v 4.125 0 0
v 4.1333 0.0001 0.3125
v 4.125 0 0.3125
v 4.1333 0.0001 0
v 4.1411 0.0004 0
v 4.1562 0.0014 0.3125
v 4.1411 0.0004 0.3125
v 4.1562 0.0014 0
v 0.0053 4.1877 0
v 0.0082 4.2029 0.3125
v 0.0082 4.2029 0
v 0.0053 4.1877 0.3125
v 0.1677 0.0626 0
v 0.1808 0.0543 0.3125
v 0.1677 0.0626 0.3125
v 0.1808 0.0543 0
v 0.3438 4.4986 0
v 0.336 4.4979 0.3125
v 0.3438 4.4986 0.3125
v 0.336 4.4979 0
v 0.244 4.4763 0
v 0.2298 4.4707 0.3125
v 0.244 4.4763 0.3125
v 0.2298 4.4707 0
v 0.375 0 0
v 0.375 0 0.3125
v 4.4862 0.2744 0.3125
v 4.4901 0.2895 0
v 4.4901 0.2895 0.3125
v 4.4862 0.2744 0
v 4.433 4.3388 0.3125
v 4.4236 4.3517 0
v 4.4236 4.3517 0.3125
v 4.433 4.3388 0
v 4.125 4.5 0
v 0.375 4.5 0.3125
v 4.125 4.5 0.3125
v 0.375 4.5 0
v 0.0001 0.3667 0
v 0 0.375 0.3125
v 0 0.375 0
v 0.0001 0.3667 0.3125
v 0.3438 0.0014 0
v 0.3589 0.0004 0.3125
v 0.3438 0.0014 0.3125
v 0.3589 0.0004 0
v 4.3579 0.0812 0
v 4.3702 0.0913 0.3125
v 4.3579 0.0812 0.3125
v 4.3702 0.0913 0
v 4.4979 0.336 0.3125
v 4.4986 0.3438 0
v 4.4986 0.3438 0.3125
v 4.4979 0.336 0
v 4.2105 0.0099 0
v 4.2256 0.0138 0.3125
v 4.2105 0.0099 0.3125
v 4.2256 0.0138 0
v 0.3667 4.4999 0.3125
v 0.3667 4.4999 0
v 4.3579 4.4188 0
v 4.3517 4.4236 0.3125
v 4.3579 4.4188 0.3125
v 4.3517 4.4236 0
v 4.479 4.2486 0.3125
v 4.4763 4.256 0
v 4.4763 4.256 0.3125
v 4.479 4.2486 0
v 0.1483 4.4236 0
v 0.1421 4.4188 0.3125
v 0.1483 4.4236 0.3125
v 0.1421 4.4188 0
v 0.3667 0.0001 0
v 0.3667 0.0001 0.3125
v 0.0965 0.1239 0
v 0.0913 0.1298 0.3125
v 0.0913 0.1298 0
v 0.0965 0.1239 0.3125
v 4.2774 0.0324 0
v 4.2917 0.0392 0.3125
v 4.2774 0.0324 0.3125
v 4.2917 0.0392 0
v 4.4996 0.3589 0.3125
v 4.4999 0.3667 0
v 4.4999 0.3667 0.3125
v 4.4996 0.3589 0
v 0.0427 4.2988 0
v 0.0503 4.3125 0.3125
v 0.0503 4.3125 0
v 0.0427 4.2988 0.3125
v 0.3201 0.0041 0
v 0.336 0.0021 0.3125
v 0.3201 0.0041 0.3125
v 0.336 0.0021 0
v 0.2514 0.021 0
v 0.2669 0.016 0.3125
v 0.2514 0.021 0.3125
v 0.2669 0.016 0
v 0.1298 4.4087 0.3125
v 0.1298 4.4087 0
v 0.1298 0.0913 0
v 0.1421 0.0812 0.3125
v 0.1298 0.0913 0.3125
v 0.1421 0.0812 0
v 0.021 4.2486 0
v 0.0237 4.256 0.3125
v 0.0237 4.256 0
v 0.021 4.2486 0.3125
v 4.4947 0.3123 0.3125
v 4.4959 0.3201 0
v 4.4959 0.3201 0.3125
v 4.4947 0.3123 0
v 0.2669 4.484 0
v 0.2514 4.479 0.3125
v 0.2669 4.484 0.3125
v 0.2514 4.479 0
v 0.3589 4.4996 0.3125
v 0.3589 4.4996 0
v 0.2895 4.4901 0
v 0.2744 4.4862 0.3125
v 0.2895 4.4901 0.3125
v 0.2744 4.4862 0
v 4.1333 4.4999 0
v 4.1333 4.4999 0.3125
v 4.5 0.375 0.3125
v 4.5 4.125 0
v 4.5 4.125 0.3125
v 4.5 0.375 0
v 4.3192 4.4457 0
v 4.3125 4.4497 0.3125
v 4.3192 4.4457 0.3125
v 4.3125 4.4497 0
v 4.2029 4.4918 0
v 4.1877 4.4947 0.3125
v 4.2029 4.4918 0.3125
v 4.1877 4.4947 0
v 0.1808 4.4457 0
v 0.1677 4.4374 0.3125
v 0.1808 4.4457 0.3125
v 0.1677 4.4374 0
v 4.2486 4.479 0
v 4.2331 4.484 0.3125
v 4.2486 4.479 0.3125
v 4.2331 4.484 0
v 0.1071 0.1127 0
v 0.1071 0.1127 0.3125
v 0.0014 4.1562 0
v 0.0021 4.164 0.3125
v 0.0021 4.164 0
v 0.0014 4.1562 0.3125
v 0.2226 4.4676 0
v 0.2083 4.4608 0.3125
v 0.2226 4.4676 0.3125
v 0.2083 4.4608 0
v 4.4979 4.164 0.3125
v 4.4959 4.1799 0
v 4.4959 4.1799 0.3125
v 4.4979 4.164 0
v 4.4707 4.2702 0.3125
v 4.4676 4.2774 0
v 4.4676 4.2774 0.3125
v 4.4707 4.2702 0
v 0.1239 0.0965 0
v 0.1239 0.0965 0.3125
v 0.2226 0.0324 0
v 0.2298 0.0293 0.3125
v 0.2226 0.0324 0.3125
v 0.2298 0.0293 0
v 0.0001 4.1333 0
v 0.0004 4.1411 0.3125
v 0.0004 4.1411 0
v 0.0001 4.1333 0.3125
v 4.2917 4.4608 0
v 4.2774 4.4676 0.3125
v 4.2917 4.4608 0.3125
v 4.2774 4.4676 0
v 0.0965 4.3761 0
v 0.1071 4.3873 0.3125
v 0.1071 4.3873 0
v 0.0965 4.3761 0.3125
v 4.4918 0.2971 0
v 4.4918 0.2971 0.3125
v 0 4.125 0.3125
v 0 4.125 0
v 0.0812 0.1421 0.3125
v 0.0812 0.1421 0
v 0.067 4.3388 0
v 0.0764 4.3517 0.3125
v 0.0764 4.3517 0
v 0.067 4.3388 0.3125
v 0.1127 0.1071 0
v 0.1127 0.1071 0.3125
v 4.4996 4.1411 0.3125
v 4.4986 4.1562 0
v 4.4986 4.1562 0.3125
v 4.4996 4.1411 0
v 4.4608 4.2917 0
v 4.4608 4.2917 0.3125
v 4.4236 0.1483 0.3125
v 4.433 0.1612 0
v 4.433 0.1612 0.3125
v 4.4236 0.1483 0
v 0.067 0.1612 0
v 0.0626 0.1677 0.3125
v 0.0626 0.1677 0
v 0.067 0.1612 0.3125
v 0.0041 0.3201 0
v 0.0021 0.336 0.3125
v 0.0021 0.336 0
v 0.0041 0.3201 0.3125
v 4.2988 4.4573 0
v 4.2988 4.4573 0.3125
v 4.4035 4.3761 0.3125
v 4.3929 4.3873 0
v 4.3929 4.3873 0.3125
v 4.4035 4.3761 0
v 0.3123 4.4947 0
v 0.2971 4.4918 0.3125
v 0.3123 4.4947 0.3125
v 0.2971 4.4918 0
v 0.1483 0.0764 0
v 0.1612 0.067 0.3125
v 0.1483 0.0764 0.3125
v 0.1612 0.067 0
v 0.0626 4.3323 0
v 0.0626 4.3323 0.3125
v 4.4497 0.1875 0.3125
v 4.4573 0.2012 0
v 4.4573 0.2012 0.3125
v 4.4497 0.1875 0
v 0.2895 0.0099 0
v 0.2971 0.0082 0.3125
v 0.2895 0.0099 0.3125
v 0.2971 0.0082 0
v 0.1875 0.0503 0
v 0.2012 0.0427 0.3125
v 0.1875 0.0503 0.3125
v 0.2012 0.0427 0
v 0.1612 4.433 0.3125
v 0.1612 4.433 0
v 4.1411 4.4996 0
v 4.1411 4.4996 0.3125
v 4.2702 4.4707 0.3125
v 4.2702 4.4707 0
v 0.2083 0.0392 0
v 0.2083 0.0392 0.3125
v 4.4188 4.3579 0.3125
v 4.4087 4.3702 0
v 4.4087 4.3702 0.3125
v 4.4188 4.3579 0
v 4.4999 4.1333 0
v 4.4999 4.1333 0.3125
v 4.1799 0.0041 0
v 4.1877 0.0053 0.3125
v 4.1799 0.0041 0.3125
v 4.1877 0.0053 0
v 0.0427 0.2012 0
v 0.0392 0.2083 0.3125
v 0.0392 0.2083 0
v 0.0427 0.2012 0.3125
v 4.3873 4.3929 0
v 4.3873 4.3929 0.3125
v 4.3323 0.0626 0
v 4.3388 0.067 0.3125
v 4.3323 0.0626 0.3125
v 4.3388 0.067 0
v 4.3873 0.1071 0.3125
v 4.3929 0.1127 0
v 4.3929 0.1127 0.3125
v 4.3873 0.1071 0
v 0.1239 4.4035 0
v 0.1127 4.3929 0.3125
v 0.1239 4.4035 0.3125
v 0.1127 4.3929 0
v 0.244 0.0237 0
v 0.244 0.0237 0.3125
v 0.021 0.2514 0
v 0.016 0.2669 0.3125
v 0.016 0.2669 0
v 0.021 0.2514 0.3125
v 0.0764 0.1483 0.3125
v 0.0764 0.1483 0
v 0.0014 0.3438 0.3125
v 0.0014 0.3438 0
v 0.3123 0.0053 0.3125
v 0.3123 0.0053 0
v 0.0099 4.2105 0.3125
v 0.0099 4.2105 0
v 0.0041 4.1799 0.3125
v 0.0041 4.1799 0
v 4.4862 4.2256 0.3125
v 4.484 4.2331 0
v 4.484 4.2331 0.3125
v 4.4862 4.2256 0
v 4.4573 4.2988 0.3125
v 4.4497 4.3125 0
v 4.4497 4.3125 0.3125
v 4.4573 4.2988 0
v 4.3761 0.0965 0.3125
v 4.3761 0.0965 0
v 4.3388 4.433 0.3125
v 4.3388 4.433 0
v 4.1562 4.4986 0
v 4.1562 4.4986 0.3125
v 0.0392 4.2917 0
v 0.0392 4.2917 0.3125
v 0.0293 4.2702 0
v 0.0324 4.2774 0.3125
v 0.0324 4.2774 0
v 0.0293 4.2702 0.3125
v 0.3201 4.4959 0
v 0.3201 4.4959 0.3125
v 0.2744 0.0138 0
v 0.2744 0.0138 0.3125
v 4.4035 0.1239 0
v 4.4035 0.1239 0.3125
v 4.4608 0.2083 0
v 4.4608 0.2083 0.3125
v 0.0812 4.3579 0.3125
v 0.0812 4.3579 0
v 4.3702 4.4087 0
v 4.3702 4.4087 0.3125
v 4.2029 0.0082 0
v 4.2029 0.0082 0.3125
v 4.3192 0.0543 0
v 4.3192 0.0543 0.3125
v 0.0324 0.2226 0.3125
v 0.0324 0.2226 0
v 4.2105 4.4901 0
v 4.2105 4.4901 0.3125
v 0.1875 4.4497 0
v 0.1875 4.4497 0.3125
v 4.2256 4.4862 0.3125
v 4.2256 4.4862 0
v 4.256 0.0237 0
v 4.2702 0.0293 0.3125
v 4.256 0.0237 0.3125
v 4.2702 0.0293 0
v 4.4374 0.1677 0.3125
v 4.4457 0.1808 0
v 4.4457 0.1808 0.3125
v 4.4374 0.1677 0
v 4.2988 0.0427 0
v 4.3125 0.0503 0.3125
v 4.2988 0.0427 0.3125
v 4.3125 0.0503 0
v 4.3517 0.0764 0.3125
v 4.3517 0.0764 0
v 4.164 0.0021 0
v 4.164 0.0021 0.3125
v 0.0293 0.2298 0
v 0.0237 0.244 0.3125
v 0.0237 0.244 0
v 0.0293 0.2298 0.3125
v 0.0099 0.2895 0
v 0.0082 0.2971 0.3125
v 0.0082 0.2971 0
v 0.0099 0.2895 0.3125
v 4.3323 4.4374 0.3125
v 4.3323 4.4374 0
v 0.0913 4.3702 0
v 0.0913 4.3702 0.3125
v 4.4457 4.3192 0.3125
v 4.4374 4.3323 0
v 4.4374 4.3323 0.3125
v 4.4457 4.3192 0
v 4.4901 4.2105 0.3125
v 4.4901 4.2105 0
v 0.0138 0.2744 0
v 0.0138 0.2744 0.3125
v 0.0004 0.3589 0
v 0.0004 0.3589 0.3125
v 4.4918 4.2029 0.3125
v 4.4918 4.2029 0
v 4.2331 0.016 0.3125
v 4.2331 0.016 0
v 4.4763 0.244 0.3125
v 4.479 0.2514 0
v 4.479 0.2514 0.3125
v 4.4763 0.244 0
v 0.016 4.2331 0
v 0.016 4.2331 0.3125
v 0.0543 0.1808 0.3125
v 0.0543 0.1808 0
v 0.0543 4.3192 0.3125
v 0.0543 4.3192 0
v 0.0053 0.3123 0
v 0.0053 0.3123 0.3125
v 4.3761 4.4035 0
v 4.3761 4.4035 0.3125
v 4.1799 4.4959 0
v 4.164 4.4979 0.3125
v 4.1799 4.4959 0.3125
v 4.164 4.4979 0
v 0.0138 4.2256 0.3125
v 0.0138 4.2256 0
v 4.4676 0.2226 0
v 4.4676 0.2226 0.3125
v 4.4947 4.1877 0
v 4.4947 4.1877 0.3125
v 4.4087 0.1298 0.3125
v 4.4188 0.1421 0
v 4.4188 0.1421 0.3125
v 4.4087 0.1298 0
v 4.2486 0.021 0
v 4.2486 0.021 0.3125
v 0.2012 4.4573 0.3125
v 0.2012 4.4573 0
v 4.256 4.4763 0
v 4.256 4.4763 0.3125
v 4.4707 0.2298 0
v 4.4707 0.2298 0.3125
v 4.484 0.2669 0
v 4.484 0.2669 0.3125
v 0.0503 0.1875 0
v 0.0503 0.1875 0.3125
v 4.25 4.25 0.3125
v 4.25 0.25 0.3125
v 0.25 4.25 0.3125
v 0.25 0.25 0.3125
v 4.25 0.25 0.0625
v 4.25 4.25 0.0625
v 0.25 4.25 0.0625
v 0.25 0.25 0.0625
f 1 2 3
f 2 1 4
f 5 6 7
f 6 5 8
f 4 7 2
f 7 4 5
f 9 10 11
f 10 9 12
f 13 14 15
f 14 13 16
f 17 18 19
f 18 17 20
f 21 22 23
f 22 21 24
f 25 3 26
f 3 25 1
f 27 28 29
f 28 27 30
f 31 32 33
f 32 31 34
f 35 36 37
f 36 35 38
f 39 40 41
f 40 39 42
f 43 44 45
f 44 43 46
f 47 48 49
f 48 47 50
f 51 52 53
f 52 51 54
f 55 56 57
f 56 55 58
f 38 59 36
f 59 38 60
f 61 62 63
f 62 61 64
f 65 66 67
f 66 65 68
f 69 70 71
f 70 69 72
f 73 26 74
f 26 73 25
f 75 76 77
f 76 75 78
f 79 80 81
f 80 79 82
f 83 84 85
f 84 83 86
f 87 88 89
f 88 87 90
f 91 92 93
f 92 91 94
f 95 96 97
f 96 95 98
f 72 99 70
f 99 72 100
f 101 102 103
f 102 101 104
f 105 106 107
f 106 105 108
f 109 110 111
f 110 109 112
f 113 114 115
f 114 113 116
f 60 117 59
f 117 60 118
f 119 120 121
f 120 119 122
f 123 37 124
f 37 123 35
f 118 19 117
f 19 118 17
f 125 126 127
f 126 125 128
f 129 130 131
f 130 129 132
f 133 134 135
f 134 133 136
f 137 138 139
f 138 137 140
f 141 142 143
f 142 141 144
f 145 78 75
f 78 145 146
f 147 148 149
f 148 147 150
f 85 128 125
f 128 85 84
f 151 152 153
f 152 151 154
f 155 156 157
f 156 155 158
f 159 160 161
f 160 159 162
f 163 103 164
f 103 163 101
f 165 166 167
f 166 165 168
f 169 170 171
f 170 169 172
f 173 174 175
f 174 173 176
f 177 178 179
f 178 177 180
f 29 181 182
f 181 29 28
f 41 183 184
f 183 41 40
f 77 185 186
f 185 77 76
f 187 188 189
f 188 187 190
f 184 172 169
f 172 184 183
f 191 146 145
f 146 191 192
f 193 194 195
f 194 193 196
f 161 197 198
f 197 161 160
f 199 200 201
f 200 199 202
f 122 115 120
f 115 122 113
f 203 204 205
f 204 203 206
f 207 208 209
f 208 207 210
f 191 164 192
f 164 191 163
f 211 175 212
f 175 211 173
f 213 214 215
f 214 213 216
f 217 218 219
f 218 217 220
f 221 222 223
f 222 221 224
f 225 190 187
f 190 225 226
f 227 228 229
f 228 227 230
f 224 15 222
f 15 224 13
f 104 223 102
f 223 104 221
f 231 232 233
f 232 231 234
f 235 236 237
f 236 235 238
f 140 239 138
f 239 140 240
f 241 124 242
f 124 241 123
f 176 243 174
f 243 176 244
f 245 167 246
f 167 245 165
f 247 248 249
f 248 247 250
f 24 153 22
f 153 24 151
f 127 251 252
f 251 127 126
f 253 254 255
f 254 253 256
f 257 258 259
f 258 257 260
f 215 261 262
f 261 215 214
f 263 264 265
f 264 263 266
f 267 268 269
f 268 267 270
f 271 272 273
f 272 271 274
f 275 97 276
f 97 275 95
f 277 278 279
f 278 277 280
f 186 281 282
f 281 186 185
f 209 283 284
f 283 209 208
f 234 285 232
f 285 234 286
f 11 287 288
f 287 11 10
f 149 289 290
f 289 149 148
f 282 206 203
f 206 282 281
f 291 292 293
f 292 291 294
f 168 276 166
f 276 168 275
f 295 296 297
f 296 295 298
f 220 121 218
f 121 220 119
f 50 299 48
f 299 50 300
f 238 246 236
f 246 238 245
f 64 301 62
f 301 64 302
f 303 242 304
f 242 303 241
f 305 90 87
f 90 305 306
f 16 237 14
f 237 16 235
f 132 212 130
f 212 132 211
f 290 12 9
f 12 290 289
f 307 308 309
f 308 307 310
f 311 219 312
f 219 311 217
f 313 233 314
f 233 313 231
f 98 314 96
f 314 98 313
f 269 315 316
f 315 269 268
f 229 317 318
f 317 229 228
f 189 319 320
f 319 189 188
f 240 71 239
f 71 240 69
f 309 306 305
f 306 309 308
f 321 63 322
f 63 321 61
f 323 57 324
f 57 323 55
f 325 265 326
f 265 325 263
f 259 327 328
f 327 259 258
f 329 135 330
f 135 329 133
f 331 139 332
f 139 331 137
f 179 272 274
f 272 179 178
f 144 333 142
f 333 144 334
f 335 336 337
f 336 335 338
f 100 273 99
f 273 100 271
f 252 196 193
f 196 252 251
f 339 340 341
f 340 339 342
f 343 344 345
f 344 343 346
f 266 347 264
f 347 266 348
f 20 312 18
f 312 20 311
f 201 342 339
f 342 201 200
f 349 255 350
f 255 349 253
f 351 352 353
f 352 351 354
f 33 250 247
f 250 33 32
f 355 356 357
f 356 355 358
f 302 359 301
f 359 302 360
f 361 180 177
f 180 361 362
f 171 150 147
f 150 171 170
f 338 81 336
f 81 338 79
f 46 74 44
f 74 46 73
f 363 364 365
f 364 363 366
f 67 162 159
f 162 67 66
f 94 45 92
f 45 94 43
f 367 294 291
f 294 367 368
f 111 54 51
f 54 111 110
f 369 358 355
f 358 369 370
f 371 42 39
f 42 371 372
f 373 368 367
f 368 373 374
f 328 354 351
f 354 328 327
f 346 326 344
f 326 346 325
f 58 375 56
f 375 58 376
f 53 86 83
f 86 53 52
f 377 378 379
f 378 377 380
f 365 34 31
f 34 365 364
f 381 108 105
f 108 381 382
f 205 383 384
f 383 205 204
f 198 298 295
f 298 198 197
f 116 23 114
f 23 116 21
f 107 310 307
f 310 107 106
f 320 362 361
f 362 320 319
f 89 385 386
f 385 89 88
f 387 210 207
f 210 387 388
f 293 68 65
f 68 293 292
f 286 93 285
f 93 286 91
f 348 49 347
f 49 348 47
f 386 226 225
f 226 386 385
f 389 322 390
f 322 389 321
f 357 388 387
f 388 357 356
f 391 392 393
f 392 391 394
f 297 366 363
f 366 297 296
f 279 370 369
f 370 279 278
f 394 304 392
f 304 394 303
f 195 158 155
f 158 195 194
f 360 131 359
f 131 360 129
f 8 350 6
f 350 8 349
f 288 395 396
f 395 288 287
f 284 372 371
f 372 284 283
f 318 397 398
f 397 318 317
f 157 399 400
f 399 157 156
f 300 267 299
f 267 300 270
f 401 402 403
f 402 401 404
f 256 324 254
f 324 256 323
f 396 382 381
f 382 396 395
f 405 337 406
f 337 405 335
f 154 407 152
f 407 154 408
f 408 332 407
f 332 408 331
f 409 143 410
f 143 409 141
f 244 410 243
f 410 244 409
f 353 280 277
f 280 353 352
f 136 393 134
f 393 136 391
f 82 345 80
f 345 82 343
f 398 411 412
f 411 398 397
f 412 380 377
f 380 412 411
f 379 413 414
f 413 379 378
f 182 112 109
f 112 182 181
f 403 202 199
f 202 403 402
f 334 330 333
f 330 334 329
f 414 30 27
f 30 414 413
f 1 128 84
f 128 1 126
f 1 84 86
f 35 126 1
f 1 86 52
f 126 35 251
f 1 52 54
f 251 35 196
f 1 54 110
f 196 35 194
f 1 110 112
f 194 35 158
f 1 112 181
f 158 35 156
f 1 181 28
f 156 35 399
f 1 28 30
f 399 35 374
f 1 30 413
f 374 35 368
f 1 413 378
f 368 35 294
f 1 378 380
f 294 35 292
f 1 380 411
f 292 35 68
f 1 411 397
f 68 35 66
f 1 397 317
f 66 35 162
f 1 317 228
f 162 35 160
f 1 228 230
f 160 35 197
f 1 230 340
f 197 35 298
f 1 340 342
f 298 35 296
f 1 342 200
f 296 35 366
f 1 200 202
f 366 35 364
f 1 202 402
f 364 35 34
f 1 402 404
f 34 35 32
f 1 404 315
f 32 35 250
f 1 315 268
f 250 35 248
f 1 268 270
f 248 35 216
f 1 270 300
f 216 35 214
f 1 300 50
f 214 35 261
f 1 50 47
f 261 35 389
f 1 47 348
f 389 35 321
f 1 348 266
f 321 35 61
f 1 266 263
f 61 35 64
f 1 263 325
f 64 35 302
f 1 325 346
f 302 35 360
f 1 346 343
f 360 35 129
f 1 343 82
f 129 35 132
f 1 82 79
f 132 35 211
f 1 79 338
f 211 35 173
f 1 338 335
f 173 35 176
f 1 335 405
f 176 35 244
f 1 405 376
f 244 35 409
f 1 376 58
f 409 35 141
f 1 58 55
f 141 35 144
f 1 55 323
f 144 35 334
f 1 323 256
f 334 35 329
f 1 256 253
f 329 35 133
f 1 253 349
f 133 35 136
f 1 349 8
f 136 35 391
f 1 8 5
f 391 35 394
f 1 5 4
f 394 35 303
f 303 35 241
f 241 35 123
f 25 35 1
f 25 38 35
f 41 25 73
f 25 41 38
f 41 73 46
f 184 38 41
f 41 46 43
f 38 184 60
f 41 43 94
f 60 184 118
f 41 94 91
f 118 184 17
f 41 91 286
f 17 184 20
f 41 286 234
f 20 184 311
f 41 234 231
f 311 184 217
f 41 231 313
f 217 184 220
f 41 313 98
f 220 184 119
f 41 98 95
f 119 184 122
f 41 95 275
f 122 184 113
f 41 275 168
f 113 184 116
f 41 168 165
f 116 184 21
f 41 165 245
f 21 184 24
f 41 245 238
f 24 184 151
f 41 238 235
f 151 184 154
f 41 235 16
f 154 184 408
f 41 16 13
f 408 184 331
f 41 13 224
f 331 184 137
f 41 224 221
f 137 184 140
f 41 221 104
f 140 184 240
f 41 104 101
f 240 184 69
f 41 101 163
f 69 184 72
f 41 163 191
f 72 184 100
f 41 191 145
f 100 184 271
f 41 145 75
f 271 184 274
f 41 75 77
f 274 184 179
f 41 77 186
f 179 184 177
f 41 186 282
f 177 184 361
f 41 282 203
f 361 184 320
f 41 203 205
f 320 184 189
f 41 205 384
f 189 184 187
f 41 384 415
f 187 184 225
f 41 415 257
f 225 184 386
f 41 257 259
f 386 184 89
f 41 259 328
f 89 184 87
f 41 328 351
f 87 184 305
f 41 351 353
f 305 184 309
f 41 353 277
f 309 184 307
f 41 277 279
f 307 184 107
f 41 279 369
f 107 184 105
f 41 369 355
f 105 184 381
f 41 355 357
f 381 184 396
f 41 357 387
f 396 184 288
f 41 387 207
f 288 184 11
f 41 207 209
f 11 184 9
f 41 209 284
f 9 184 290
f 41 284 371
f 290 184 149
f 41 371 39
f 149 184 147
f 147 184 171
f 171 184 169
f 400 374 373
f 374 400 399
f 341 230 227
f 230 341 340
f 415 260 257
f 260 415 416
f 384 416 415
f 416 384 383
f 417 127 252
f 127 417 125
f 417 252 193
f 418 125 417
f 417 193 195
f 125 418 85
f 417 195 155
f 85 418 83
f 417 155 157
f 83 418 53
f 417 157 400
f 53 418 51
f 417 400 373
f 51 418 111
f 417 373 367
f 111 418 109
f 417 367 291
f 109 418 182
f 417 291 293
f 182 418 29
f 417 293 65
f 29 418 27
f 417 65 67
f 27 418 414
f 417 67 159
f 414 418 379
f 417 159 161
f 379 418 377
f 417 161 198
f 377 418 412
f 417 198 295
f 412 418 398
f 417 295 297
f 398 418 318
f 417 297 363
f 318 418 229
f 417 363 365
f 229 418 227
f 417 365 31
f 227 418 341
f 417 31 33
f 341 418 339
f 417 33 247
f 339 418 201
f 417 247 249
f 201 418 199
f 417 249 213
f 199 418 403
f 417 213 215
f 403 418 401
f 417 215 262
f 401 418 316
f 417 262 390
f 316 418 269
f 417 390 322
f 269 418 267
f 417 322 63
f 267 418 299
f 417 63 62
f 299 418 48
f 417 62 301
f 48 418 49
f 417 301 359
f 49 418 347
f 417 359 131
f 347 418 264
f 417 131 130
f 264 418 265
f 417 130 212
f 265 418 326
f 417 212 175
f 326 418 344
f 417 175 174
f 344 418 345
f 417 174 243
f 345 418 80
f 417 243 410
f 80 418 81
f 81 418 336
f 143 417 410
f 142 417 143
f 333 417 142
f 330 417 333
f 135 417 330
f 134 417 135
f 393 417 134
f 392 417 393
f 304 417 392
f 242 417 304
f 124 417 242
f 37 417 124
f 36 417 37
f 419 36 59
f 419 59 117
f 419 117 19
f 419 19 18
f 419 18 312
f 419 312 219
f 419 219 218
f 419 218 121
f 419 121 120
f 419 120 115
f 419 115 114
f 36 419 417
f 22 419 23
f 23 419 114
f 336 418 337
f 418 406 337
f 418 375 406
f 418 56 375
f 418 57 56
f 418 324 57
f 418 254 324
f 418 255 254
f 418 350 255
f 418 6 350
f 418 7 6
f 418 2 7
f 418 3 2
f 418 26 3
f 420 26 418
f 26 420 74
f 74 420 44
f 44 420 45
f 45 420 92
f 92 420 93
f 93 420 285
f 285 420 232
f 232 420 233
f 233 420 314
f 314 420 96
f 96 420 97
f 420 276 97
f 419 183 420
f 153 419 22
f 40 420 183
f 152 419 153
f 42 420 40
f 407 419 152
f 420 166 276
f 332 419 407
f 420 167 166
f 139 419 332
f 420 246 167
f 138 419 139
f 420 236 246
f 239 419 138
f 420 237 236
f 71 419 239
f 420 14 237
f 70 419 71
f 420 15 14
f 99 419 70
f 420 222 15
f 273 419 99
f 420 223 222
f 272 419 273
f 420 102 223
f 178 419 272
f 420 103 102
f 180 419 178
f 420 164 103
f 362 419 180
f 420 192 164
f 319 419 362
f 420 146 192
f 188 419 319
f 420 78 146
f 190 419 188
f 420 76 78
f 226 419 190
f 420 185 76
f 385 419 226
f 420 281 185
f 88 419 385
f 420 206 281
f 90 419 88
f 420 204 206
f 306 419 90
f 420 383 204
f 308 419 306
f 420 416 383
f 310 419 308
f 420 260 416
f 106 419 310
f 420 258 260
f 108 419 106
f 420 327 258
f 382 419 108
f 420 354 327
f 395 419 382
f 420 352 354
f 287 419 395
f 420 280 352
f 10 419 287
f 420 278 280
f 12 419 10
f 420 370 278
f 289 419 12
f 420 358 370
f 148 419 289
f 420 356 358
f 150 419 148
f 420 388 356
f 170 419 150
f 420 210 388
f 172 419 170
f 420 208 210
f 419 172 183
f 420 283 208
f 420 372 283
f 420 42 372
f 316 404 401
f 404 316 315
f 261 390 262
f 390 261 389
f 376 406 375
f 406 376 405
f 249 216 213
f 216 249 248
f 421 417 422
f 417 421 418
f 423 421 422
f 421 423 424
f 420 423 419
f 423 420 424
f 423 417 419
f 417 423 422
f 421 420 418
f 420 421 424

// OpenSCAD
$fn = 100;

module rounded_square(size, corner_radius) {
    translate([corner_radius, corner_radius, 0]) minkowski() {
        square(size - corner_radius * 2, size - corner_radius * 2);
        circle(corner_radius);
    }
}

size = 4;
height = 1/4;
border_width = 1/4;
base_thickness = 1/16;

translate([border_width, border_width, 0]) difference() {
    linear_extrude(base_thickness + height) offset(border_width) rounded_square(size, border_width / 2);
    translate([0, 0, base_thickness]) cube([size, size, height * 2]);
}
